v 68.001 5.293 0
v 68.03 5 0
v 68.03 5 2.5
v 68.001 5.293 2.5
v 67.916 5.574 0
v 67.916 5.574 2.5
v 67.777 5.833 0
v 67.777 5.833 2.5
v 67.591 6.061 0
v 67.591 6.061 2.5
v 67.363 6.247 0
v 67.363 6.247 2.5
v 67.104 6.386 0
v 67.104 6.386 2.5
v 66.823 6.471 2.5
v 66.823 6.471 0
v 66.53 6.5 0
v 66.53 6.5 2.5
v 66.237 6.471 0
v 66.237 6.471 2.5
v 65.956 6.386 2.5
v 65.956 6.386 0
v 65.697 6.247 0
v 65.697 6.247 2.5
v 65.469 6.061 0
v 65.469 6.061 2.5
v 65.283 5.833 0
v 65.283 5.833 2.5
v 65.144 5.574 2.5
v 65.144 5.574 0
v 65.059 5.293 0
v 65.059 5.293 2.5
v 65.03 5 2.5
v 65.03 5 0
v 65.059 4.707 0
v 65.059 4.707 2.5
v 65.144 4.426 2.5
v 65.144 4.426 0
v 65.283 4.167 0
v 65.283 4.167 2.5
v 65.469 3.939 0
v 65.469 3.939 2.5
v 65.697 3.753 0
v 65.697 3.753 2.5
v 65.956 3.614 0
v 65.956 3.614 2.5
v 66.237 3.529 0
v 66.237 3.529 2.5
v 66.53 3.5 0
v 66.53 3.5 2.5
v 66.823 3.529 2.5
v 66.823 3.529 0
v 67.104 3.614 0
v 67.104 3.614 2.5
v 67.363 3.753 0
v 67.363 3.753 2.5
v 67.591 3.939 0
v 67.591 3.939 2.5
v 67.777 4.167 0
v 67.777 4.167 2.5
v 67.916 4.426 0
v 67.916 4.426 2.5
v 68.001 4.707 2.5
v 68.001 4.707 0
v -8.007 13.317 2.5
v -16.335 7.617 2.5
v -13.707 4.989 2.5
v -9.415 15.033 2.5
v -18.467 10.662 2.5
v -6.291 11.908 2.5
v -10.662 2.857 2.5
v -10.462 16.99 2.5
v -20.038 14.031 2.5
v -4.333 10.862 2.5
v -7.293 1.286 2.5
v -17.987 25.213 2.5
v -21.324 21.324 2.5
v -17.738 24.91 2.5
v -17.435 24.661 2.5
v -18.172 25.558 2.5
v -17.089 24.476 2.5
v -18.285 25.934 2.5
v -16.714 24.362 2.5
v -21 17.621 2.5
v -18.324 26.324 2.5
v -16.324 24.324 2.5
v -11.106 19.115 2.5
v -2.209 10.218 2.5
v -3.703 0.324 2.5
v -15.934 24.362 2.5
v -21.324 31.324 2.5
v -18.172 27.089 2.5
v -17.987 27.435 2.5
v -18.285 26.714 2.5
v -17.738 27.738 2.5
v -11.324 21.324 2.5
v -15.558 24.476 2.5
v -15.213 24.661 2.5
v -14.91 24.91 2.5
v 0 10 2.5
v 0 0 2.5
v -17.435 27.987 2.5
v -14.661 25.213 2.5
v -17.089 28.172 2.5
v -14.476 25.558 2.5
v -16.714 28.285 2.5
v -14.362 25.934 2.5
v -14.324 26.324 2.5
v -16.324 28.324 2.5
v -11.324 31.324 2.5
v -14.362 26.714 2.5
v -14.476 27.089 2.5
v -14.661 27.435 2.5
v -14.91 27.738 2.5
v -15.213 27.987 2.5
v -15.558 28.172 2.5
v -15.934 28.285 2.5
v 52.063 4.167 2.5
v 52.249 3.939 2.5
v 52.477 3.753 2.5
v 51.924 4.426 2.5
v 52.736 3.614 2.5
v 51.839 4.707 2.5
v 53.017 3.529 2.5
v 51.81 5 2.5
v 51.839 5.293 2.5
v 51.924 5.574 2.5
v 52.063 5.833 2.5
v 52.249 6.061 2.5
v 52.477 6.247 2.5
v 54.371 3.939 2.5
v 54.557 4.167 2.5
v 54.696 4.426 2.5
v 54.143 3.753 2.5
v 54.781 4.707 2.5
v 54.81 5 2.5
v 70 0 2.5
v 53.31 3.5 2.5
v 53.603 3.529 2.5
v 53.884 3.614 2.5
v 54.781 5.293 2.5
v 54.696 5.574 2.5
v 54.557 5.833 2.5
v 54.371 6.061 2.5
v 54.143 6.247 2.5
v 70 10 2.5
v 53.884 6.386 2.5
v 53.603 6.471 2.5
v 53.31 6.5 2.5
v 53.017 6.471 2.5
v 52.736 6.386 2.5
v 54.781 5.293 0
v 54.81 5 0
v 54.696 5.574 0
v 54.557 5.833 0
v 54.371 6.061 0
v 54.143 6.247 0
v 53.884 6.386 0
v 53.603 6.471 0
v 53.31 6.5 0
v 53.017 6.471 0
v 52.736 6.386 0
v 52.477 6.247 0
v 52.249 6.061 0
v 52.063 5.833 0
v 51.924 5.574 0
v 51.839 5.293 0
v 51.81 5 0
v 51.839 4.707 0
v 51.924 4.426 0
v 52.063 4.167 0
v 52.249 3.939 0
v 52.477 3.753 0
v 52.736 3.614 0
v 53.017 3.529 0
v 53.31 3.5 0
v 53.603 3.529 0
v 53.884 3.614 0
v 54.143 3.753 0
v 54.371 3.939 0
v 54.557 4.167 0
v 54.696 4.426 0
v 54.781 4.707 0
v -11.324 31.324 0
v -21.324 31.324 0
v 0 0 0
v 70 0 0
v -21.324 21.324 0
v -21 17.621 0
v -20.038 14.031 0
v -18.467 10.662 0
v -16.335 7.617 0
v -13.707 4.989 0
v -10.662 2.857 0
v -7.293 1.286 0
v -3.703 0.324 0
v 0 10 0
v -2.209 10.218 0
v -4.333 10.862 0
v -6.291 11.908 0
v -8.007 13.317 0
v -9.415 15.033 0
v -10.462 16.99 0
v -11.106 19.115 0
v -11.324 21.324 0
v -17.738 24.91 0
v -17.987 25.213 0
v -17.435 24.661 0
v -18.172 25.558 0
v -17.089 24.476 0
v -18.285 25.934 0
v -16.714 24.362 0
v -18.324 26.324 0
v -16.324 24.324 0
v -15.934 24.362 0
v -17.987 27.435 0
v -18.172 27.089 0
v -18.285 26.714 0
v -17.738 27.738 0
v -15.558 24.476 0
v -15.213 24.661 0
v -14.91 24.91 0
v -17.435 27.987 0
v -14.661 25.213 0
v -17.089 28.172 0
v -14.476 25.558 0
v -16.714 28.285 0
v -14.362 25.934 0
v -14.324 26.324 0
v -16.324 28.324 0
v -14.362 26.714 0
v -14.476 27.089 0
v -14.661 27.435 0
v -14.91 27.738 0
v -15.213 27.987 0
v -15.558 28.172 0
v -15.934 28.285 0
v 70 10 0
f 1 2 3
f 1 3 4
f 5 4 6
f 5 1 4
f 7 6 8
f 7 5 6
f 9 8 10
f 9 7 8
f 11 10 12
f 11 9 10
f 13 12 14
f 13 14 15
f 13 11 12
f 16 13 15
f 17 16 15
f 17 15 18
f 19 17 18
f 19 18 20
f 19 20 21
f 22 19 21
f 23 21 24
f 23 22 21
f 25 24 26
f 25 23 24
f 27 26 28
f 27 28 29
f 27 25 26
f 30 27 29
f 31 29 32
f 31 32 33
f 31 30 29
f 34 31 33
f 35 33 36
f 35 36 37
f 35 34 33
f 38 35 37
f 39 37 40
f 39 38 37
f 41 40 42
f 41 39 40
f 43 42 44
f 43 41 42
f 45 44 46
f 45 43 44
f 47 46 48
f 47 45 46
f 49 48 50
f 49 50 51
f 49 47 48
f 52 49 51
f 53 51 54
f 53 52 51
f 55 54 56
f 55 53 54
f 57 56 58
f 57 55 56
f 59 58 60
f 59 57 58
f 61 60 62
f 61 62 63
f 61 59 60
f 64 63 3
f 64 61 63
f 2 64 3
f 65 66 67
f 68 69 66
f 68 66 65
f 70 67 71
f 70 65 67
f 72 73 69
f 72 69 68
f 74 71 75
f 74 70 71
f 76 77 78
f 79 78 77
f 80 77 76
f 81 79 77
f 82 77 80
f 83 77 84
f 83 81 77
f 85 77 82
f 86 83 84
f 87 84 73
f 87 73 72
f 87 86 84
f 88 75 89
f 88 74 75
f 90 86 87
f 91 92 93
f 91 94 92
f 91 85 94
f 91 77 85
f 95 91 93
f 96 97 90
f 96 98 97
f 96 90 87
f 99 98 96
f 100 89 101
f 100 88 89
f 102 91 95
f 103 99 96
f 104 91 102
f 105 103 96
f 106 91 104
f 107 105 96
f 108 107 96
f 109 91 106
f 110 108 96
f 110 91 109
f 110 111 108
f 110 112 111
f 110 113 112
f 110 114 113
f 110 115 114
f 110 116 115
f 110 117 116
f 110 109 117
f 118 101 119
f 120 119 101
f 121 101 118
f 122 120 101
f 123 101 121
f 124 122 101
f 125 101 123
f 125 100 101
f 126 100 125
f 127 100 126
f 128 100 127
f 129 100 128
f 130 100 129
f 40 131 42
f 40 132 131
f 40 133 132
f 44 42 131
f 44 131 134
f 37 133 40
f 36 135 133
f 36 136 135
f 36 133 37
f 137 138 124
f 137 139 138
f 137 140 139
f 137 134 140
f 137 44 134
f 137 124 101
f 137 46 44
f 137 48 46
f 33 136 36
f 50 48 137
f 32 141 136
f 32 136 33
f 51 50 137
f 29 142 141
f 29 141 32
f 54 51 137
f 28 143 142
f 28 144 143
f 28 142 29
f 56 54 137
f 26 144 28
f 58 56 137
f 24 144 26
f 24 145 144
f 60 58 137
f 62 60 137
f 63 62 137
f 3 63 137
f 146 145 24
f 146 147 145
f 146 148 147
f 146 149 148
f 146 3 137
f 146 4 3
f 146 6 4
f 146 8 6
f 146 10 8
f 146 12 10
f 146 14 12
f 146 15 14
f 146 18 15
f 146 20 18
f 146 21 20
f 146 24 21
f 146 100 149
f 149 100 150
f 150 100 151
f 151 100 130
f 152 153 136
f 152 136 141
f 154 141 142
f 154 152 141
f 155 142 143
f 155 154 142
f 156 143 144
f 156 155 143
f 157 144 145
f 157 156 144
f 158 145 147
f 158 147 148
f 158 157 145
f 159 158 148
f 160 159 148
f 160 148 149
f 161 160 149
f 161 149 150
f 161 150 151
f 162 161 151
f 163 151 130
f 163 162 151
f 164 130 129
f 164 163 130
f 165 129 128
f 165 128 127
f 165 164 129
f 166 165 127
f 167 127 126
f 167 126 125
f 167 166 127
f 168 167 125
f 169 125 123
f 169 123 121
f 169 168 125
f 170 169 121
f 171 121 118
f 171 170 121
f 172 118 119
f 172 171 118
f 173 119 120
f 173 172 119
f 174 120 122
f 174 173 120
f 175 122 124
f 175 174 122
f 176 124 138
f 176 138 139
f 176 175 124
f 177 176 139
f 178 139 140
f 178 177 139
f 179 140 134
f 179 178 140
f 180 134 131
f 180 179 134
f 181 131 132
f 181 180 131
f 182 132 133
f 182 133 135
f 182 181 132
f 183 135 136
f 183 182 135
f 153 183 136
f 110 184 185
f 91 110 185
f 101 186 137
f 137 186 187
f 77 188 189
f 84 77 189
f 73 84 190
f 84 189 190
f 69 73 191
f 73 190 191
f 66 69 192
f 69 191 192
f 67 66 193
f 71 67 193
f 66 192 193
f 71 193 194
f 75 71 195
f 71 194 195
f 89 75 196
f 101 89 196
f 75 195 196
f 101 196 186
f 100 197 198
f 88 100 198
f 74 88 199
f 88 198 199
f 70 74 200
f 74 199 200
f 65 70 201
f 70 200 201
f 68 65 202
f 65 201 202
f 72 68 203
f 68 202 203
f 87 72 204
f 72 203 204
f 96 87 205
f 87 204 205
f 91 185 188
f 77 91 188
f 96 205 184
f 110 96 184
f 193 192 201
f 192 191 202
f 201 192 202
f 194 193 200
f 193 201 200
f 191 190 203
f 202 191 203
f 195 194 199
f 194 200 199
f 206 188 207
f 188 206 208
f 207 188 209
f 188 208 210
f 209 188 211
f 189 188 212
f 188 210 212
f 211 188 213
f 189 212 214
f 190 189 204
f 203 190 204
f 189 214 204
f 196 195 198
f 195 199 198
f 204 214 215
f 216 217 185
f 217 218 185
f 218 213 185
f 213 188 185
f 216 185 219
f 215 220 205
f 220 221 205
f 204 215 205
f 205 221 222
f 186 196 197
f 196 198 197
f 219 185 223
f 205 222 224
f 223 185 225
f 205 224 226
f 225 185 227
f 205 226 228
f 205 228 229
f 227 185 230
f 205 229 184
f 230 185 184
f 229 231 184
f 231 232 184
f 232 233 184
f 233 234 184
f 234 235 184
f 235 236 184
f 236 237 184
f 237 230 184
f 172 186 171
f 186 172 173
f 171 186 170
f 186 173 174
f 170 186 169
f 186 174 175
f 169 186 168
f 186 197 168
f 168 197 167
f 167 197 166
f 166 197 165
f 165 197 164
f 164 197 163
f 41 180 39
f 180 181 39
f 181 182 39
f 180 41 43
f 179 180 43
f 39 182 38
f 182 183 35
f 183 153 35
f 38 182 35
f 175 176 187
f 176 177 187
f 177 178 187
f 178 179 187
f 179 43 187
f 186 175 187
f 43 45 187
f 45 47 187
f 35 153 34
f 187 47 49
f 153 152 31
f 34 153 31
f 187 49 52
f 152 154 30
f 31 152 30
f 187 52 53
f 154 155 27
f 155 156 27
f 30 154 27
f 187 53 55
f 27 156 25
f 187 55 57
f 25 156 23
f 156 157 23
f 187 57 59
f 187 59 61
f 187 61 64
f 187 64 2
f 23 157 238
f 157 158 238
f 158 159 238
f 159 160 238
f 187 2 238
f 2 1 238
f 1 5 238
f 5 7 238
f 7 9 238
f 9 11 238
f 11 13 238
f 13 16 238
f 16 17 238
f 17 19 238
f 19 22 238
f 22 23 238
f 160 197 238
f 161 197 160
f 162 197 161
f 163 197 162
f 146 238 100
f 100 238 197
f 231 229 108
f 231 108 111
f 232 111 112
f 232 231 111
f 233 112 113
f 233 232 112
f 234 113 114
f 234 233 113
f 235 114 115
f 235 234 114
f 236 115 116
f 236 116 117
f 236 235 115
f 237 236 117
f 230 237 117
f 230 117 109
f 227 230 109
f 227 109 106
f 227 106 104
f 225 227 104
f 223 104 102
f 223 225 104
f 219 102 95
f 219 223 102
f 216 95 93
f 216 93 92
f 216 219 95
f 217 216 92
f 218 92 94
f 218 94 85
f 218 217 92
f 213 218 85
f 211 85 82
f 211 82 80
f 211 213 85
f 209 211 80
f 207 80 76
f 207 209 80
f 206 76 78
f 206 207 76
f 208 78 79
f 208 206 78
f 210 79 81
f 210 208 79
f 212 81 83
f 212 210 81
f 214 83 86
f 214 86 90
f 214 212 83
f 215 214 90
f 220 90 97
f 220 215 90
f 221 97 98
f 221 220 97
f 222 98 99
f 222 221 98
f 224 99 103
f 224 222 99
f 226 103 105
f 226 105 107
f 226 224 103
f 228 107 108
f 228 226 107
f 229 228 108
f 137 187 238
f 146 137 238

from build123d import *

# Parameters (mm, degrees)
ESQUISSE1_R        = 2
ESQUISSE1_R_2      = 1.5
BOSS_EXTRU_1_DEPTH = 2.5


with BuildPart() as part:
    # Esquisse1 → Boss.-Extru.1 (new body)
    with BuildSketch(Plane.XY):
        with BuildLine():
            Line((0, 0), (70, 0))
            Line((70, 0), (70, 10))
            Line((70, 10), (0, 10))
            ThreePointArc((0, 10), (-8.007101932, 13.316650215), (-11.323752147, 21.323752147))
            Line((-11.323752147, 21.323752147), (-11.323752147, 31.323752147))
            Line((-11.323752147, 31.323752147), (-21.323752147, 31.323752147))
            Line((-21.323752147, 31.323752147), (-21.323752147, 21.323752147))
            ThreePointArc((-21.323752147, 21.323752147), (-15.078169744, 6.245582404), (0, 0))
        make_face()
        with Locations((-16.323752147, 26.323752147)):
            Circle(ESQUISSE1_R, mode=Mode.SUBTRACT)
        with Locations((66.53, 5)):
            Circle(ESQUISSE1_R_2, mode=Mode.SUBTRACT)
        with Locations((53.31, 5)):
            Circle(ESQUISSE1_R_2, mode=Mode.SUBTRACT)
    extrude(amount=BOSS_EXTRU_1_DEPTH)


solid = part.part
